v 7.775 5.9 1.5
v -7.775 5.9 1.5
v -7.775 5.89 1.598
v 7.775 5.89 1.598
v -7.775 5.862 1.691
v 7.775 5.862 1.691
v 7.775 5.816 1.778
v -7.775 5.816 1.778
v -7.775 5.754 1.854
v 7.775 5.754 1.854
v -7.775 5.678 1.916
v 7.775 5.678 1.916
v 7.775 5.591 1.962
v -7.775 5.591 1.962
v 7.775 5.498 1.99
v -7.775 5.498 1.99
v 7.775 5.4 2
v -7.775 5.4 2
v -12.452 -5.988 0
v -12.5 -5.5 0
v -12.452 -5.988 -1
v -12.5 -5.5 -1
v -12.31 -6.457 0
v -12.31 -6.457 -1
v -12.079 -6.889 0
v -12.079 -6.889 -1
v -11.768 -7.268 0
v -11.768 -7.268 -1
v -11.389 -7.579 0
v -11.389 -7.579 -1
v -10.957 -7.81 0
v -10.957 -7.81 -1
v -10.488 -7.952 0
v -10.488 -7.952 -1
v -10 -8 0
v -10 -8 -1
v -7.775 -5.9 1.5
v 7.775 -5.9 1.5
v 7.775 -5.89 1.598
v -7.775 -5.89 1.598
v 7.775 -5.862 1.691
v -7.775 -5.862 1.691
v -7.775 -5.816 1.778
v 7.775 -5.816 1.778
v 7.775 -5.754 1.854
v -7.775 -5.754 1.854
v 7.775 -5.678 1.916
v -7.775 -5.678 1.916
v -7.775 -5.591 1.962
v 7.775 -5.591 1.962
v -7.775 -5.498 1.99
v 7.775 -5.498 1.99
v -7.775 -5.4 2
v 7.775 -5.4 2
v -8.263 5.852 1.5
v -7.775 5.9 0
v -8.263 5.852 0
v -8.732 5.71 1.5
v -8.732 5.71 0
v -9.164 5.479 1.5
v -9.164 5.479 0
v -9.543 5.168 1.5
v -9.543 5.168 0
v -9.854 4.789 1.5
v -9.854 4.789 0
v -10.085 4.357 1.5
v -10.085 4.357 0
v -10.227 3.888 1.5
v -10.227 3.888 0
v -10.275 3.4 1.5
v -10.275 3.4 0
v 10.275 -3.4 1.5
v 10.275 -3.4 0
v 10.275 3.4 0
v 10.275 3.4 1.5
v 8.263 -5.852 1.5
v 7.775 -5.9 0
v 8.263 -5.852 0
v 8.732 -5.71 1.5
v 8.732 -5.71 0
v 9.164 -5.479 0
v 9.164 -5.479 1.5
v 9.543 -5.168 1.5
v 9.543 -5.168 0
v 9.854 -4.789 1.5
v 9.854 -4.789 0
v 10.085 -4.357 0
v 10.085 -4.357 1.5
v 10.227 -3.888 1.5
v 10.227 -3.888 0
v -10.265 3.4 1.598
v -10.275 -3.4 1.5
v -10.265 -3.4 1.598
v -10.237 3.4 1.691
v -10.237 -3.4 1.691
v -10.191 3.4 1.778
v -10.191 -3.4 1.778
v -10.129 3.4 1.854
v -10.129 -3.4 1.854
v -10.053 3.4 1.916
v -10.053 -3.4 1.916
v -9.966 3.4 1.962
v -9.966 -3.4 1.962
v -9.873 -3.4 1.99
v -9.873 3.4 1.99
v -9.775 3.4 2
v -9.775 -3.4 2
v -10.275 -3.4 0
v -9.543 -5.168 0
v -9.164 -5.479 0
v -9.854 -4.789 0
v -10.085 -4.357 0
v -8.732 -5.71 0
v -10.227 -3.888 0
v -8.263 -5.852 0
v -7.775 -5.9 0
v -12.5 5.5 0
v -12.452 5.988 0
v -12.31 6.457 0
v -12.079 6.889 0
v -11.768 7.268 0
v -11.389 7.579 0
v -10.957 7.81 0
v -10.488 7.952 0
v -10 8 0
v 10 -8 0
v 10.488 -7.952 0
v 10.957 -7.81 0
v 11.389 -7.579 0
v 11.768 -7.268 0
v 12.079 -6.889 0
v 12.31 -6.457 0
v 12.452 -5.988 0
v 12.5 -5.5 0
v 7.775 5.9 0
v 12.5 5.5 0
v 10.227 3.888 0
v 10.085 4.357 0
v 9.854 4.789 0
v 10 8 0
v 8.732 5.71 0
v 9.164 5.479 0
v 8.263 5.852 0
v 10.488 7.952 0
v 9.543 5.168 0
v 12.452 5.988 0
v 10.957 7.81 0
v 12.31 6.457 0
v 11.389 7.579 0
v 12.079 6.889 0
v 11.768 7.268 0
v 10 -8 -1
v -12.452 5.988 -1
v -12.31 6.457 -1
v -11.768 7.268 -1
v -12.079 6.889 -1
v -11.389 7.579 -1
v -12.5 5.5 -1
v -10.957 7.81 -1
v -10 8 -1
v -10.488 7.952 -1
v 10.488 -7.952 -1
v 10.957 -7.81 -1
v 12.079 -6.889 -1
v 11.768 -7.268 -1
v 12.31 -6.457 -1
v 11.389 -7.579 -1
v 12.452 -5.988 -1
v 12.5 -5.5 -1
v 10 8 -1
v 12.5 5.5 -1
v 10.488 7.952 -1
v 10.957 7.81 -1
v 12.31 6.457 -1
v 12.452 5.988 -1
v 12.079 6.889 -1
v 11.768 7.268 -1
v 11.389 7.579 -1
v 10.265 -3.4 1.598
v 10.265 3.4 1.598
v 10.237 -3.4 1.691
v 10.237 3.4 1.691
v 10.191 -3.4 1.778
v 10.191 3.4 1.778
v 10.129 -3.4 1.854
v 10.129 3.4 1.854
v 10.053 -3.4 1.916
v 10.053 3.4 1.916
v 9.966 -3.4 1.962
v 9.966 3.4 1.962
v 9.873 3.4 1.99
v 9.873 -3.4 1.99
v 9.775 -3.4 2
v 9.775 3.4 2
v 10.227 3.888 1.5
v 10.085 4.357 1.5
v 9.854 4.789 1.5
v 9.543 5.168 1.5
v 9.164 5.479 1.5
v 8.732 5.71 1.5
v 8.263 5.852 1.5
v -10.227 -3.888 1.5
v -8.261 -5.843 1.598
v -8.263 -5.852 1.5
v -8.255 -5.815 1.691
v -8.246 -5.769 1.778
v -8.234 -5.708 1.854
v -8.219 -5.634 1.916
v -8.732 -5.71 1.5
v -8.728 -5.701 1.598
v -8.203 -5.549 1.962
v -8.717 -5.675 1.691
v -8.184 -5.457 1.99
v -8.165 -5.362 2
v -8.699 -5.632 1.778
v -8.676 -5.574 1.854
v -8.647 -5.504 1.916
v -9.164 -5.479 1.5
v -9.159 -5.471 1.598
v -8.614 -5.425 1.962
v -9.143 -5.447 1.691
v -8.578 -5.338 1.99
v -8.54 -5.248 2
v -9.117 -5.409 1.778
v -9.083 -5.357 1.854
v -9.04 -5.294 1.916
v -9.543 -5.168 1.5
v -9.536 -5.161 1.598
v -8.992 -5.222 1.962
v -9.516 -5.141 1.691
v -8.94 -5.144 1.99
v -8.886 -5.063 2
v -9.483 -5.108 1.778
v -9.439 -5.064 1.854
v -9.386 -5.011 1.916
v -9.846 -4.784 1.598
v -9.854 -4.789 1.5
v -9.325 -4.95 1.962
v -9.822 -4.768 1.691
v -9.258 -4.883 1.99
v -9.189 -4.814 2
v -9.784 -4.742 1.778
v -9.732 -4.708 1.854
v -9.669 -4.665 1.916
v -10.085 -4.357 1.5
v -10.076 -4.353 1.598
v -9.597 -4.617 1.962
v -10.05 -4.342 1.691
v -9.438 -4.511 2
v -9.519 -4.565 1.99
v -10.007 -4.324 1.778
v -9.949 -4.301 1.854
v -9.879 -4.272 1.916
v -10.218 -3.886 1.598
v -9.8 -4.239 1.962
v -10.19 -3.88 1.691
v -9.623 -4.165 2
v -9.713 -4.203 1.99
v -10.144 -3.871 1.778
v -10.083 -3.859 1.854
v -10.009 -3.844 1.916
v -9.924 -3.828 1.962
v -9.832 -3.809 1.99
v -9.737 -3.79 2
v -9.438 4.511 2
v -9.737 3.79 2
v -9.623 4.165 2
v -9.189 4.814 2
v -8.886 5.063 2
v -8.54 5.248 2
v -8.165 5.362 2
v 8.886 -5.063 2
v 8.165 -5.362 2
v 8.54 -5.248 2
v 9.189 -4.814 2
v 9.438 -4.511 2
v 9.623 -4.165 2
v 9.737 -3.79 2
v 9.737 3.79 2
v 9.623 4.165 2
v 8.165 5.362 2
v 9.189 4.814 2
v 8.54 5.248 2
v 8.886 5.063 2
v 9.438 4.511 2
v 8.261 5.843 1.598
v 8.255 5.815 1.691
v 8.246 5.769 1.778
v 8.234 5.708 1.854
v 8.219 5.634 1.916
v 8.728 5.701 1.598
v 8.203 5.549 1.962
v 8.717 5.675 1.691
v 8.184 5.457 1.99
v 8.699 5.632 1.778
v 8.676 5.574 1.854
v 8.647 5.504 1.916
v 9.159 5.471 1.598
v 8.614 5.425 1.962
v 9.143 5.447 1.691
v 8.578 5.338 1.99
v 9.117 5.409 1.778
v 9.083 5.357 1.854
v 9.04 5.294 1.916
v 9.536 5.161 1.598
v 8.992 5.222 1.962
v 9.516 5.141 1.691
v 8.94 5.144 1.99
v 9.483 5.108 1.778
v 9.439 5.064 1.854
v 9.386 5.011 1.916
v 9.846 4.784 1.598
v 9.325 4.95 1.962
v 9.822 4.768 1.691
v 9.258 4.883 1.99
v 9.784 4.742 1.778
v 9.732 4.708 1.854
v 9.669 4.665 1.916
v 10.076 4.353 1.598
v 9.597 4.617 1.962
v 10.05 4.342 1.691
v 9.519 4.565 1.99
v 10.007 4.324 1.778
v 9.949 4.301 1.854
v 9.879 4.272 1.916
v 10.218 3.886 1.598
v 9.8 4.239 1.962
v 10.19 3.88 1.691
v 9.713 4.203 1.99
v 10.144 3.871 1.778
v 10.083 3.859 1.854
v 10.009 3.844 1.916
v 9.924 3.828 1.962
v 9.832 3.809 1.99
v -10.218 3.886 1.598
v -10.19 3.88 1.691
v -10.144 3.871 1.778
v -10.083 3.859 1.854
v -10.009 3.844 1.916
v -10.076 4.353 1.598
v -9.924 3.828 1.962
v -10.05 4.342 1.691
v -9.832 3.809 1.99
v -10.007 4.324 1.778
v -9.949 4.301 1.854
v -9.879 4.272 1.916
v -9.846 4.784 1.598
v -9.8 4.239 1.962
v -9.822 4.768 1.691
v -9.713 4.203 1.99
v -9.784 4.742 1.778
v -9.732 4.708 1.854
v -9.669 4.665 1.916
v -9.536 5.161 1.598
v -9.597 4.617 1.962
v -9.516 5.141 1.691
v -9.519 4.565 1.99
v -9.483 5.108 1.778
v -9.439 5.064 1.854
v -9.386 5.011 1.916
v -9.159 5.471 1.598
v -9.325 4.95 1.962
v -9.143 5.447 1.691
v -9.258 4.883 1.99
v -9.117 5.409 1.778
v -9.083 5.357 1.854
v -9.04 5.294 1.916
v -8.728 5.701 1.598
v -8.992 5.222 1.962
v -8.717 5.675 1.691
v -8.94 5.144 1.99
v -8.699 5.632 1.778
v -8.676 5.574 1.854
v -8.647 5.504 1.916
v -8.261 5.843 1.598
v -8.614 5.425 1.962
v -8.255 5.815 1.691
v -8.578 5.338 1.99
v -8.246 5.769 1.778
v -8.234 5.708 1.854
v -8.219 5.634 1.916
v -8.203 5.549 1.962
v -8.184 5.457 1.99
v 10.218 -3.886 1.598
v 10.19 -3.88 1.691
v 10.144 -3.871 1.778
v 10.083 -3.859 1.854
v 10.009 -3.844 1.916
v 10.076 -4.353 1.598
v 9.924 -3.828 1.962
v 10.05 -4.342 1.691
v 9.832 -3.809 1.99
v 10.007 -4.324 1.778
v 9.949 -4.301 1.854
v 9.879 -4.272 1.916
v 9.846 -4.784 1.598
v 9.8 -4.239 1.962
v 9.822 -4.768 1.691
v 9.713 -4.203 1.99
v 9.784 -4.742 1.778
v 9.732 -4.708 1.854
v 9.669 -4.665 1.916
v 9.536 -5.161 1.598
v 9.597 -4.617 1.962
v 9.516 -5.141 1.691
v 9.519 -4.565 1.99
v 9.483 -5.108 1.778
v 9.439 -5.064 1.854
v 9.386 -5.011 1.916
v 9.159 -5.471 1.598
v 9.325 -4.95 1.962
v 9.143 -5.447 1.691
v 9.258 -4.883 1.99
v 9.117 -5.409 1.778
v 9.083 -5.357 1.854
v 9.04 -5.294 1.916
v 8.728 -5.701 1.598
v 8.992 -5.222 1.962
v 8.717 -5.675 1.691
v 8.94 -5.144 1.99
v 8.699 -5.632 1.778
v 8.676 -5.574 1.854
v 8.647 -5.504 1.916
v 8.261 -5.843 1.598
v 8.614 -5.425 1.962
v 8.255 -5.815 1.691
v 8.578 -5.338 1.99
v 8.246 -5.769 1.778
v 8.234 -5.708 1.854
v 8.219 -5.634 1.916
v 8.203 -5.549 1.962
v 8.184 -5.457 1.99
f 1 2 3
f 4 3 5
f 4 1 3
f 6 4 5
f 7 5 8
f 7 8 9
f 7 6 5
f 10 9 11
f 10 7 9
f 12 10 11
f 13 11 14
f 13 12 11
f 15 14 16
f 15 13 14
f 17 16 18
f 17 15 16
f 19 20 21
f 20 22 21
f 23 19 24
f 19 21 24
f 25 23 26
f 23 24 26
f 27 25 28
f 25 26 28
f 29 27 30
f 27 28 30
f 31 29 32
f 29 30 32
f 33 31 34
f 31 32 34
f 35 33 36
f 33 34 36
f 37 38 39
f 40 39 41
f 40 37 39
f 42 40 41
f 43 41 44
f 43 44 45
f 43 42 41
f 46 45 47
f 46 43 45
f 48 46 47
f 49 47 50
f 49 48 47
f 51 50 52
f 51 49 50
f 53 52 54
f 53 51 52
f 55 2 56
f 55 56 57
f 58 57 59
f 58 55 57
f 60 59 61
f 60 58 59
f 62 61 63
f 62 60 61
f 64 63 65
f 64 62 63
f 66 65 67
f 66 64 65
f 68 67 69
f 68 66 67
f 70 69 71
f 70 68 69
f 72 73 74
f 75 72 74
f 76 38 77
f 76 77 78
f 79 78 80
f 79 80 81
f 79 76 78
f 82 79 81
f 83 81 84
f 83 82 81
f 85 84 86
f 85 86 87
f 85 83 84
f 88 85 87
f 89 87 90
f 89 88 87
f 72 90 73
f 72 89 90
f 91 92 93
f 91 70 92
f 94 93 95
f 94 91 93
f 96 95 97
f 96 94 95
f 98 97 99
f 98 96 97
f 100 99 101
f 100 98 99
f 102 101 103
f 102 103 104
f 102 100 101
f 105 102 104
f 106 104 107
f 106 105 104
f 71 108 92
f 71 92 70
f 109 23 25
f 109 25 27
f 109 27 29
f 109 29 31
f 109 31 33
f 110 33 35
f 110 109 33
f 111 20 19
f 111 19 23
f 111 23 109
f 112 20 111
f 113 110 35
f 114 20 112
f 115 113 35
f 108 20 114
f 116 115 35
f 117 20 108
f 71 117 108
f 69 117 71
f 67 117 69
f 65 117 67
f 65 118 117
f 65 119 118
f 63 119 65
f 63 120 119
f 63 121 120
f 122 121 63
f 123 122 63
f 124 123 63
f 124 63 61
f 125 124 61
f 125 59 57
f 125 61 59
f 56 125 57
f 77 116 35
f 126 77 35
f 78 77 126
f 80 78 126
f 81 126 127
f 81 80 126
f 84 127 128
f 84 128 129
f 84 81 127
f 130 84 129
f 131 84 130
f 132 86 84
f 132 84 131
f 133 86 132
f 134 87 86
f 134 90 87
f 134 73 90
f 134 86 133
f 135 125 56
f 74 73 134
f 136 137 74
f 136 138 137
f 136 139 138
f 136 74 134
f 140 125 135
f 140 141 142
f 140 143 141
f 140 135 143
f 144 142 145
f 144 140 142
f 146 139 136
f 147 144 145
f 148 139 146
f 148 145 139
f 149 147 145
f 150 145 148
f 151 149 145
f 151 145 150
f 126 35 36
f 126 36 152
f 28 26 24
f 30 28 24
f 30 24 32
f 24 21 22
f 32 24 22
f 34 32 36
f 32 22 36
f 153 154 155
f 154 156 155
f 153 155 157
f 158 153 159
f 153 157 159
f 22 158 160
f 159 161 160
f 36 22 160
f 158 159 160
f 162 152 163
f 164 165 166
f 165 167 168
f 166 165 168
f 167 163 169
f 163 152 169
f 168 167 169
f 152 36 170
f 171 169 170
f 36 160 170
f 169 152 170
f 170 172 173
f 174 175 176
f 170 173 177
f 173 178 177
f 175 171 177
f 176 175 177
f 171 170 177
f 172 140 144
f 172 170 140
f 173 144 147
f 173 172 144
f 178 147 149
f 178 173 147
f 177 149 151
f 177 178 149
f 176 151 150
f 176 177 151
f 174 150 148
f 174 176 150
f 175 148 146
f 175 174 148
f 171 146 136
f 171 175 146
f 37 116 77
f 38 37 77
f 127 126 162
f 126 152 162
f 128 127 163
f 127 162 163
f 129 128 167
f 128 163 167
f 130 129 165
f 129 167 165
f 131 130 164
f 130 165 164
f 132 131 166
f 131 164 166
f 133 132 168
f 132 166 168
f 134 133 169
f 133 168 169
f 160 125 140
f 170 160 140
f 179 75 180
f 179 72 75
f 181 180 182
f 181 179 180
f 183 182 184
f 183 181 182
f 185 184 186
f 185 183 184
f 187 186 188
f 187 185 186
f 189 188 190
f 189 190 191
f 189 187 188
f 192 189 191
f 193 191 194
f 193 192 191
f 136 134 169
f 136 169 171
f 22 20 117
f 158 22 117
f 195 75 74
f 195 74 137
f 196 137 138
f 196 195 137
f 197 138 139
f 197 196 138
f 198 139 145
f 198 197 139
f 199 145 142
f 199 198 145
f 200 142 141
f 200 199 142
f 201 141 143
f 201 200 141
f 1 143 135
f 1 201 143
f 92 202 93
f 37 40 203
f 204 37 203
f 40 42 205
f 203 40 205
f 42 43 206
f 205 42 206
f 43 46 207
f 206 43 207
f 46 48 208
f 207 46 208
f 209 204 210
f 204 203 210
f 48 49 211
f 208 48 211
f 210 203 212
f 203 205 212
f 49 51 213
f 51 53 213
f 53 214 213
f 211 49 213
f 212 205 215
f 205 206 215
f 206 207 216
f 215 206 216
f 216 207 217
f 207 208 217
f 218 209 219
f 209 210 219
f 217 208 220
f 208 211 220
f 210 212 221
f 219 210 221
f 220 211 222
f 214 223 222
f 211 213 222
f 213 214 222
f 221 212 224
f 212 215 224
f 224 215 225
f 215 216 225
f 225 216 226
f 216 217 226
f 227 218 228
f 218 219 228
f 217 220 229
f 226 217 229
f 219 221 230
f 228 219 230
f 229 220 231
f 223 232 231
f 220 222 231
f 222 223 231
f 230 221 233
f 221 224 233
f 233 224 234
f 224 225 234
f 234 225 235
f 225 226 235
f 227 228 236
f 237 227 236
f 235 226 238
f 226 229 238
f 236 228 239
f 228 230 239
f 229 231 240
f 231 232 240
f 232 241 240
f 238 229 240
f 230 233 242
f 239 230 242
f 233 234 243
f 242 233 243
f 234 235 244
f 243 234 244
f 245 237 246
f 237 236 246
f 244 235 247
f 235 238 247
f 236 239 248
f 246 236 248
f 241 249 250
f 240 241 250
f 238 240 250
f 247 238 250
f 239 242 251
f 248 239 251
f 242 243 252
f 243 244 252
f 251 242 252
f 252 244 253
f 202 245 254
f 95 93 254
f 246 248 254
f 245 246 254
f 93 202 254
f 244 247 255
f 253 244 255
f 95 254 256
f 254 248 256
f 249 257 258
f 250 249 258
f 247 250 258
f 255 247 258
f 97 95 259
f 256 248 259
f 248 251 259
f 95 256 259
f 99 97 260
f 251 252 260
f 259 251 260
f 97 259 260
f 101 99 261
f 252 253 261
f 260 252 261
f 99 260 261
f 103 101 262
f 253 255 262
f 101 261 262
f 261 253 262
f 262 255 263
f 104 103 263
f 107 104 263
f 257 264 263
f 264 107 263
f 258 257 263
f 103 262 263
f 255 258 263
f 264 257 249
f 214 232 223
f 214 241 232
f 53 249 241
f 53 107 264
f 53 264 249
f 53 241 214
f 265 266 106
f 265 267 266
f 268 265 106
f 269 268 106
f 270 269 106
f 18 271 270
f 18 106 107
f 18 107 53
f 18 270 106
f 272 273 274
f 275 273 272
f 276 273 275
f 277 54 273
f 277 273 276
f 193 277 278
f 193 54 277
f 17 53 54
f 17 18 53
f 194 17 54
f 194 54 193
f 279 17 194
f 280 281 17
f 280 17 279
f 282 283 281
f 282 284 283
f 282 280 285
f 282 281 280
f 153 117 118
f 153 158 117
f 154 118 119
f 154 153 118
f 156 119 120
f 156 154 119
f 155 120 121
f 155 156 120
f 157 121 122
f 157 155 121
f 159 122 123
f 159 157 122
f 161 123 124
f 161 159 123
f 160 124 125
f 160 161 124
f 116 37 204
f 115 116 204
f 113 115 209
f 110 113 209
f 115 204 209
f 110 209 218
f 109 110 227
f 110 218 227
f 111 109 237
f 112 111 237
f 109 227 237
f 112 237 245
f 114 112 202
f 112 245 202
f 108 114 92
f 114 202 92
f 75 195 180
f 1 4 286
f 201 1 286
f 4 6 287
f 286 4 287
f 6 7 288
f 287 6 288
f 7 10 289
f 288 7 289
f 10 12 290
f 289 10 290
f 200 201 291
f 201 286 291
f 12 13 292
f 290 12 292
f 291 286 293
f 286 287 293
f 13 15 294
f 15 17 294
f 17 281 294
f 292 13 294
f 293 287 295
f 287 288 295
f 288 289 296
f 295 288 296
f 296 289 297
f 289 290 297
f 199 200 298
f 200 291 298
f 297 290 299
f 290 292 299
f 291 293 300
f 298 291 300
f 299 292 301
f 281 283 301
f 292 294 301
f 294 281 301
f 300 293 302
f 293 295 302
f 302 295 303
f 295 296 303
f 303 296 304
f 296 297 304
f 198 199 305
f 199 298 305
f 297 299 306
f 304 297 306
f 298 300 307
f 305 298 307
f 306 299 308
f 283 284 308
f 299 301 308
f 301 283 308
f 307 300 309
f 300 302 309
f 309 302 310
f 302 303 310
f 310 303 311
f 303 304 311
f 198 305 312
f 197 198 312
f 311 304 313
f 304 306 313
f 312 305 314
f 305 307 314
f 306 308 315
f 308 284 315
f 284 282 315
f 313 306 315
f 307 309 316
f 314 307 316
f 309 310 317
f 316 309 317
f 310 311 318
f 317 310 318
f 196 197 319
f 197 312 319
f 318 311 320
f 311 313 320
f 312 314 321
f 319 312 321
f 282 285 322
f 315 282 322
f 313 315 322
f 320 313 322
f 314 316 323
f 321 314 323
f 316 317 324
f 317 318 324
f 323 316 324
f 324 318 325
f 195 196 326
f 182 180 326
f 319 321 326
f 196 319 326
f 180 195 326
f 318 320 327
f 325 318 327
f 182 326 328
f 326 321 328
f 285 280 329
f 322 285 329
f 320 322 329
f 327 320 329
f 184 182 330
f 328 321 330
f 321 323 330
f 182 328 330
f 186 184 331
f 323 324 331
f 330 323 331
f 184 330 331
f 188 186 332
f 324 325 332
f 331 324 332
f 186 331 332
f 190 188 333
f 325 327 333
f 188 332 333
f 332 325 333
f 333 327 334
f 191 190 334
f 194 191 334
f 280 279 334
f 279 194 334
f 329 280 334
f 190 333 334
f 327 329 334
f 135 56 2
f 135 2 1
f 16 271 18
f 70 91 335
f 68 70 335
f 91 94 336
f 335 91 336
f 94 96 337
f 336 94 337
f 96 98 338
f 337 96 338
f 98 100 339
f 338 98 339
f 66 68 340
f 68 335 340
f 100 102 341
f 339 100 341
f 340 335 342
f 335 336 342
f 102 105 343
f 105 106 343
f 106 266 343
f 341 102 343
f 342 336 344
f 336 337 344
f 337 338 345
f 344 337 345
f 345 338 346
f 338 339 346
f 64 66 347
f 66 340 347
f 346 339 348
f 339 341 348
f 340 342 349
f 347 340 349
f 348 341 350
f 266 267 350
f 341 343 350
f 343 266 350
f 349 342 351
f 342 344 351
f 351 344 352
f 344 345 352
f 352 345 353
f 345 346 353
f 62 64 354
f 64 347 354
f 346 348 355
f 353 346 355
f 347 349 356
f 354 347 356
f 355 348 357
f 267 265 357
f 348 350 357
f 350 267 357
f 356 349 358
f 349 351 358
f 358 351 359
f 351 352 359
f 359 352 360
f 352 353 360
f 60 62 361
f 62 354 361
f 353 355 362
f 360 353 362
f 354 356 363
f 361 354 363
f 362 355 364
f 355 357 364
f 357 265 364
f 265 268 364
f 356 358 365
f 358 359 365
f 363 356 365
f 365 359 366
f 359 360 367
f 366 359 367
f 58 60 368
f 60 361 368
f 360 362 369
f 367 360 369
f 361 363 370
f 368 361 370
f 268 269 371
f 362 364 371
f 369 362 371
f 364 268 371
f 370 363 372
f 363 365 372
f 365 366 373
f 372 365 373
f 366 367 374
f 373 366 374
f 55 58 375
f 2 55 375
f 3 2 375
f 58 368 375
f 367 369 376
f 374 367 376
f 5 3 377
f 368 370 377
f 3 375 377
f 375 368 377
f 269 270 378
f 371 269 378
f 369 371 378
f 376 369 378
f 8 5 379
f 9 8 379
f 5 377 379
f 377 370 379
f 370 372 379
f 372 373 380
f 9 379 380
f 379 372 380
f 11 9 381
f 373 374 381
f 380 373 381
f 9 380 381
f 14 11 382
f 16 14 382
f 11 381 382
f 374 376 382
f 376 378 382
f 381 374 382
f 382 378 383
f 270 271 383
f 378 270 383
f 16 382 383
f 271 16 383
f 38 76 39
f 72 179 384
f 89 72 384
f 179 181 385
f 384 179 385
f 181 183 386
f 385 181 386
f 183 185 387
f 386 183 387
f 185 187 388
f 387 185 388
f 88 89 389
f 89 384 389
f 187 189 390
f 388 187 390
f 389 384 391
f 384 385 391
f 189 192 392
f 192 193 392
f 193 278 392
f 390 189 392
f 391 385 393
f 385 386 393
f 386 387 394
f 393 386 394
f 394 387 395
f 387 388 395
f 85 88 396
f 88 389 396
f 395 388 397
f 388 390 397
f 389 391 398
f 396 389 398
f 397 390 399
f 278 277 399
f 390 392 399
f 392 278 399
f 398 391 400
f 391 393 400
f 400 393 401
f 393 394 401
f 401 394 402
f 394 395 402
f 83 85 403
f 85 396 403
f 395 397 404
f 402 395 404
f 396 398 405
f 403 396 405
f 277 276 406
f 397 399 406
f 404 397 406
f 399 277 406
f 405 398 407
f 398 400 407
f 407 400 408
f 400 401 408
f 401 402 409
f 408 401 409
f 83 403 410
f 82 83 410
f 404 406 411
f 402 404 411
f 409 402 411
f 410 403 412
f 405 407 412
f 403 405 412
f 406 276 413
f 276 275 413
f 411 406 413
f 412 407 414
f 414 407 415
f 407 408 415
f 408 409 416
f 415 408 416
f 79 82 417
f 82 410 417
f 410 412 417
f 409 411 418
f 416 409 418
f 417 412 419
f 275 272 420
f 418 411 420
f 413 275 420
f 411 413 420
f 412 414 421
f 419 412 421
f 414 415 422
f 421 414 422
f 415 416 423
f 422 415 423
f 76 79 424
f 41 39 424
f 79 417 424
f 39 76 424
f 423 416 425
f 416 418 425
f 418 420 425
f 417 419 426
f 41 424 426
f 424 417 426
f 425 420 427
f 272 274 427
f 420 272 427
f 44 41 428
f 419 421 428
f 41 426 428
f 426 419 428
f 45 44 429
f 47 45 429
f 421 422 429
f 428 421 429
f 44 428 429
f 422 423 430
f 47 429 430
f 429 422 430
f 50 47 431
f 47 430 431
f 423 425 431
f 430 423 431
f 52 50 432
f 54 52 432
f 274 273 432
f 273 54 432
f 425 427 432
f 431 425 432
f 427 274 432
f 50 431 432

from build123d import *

# Parameters (mm, degrees)
SKETCH1_W           = 25
SKETCH1_H           = 16
BOSS_EXTRUDE1_DEPTH = 1
SKETCH2_W           = 20.55
SKETCH2_H           = 11.8
BOSS_EXTRUDE2_DEPTH = 2
FILLET1_R           = 2.5
FILLET2_R           = 0.5


with BuildPart() as part:
    # Sketch1 → Boss-Extrude1 (new body)
    with BuildSketch(Plane.XY):
        Rectangle(SKETCH1_W, SKETCH1_H)
    extrude(amount=-BOSS_EXTRUDE1_DEPTH)

    # Sketch2 → Boss-Extrude2 (add)
    with BuildSketch(Plane.XY):
        Rectangle(SKETCH2_W, SKETCH2_H)
    extrude(amount=BOSS_EXTRUDE2_DEPTH)

    # Fillet1
    fillet1_edges = [part.edges().sort_by_distance(p)[0] for p in [
        (10.275, -5.9, 1),
        (10.275, 5.9, 1),
        (-10.275, 5.9, 1),
        (-10.275, -5.9, 1),
        (12.5, -8, -0.5),
        (-12.5, -8, -0.5),
        (-12.5, 8, -0.5),
        (12.5, 8, -0.5),
    ]]
    fillet(fillet1_edges, radius=FILLET1_R)

    # Fillet2
    fillet2_edges = [part.edges().sort_by_distance(p)[0] for p in [
        (0, 5.9, 2),
        (10.275, 0, 2),
        (-10.275, 0, 2),
        (0, -5.9, 2),
        (9.542766953, -5.167766953, 2),
        (-9.542766953, -5.167766953, 2),
        (-9.542766953, 5.167766953, 2),
        (9.542766953, 5.167766953, 2),
    ]]
    fillet(fillet2_edges, radius=FILLET2_R)


solid = part.part
